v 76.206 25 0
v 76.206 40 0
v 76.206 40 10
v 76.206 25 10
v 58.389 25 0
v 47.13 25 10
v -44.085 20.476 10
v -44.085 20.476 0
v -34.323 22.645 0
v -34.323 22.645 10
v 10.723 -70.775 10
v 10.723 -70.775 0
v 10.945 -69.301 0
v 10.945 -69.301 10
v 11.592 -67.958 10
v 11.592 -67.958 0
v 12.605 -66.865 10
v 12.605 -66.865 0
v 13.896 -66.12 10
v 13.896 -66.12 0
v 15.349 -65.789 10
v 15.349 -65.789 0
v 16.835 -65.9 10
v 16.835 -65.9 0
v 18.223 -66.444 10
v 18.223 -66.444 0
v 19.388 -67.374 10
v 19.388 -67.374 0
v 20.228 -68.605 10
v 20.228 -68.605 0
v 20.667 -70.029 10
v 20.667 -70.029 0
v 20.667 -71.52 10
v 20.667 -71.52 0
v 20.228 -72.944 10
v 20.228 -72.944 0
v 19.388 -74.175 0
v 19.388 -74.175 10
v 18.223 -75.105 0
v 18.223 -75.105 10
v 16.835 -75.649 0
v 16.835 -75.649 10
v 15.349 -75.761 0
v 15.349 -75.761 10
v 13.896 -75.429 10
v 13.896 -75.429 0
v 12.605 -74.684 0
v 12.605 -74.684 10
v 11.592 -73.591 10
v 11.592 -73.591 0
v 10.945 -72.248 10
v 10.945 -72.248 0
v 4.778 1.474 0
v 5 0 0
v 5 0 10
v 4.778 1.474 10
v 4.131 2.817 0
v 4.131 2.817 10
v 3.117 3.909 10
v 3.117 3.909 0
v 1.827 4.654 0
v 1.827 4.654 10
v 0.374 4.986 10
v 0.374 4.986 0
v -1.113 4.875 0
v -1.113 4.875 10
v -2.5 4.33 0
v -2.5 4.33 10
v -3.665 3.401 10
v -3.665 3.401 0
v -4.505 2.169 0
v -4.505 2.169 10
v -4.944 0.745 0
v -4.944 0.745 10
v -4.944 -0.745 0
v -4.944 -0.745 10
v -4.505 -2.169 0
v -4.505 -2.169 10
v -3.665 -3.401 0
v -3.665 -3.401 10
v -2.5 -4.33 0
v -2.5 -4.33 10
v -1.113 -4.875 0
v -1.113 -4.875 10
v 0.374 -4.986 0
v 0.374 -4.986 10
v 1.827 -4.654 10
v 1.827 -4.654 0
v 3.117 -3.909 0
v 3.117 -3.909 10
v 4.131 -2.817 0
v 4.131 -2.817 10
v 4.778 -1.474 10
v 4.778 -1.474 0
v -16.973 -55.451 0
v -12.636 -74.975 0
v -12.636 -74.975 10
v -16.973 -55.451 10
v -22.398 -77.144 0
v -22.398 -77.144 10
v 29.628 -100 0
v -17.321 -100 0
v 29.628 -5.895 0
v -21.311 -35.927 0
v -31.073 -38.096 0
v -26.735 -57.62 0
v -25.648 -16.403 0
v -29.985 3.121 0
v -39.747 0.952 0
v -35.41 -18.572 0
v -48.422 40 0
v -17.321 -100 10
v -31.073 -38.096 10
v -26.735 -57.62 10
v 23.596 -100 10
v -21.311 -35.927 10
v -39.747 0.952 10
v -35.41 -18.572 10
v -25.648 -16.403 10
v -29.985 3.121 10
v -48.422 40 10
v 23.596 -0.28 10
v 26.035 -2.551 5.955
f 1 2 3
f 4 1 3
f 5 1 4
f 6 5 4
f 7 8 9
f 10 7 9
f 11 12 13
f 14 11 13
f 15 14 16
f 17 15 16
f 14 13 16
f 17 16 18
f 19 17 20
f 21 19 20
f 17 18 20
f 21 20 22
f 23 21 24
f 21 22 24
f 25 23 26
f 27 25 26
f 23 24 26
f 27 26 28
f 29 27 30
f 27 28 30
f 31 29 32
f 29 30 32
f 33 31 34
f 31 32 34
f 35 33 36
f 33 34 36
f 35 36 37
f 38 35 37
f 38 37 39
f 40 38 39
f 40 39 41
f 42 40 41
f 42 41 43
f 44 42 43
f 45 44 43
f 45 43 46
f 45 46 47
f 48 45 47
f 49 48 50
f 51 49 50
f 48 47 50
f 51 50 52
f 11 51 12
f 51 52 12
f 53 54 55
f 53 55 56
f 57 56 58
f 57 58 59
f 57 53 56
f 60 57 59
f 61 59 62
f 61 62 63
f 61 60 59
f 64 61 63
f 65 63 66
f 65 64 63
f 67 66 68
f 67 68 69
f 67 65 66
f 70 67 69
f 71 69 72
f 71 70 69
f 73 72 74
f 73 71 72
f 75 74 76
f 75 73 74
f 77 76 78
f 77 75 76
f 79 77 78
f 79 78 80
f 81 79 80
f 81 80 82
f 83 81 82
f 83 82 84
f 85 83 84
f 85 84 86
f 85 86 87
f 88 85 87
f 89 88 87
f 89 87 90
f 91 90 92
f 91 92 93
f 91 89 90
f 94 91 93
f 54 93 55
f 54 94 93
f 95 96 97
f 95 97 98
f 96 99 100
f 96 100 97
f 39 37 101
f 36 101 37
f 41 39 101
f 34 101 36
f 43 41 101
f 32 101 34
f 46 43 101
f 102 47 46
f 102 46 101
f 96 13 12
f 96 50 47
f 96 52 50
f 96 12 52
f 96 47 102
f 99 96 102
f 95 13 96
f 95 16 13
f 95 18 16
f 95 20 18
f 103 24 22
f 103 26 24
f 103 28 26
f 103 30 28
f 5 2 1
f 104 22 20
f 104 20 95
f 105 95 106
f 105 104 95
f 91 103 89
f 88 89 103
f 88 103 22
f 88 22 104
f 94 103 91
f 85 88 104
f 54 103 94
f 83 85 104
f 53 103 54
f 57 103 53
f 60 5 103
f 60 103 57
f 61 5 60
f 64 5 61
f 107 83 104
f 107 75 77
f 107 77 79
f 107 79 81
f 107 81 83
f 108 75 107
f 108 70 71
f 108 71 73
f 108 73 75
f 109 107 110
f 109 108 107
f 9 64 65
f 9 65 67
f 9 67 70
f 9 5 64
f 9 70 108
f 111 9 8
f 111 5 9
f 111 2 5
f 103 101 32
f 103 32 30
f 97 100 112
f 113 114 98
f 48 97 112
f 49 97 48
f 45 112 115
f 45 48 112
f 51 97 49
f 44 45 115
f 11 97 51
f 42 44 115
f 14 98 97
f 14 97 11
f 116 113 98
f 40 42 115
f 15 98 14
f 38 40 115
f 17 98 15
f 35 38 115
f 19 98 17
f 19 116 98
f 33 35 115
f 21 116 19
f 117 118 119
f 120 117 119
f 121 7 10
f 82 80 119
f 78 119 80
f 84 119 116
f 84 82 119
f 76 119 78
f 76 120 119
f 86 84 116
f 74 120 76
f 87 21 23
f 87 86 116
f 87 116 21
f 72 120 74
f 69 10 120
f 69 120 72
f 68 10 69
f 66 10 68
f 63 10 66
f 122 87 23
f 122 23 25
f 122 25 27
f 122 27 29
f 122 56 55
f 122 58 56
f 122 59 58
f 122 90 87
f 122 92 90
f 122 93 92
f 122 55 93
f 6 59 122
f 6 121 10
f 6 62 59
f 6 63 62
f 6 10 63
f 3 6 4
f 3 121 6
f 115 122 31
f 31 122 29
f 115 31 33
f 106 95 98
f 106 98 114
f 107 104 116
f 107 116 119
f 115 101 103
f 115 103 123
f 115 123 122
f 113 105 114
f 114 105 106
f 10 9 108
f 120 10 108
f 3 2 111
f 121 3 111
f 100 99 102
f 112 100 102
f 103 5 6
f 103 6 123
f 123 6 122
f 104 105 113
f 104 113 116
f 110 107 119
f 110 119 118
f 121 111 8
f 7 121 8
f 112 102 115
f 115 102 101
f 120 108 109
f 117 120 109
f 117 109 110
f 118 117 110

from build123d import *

# Parameters (mm, degrees)
SKETCH1_R           = 5
BOSS_EXTRUDE1_DEPTH = 10
CUT_EXTRUDE1_DEPTH  = 10
CUT_EXTRUDE2_DEPTH  = 10
CUT_EXTRUDE3_DEPTH  = 10
BOSS_EXTRUDE2_DEPTH = 15
SKETCH6_R           = 5
CUT_EXTRUDE4_DEPTH  = 10


with BuildPart() as part:
    # Sketch1 → Boss-Extrude1 (new body)
    with BuildSketch(Plane.XY):
        Polygon((-48.4220718, 40), (-17.320508076, -100), (29.627689013, -100), (29.627689013, -5.894941242), (72.353358785, 40), (54.770735732, 40), align=None)
        Circle(SKETCH1_R, mode=Mode.SUBTRACT)
    extrude(amount=BOSS_EXTRUDE1_DEPTH)

    # Sketch2 → Cut-Extrude1 (cut)
    with BuildSketch(Plane(origin=(0, 0, 0), x_dir=(-1, 0, 0), z_dir=(0, 0, -1))):
        Polygon((44.084731449, 20.475976883), (34.322719891, 22.644647058), (29.98537954, 3.120623941), (39.747391098, 0.951953766), align=None)
        Polygon((25.648039189, -16.403399176), (35.410050747, -18.572069352), (31.072710396, -38.096092469), (21.310698838, -35.927422293), align=None)
        Polygon((16.973358487, -55.45144541), (26.735370045, -57.620115586), (22.398029694, -77.144138703), (12.636018136, -74.975468528), align=None)
    extrude(amount=-CUT_EXTRUDE1_DEPTH, mode=Mode.SUBTRACT)

    # Sketch3 → Cut-Extrude2 (cut)
    with BuildSketch(Plane(origin=(11.20335331, -10.42970665, 12.614201102), x_dir=(-0.825201513, -0.359925431, 0.435311551), z_dir=(-0.564838439, 0.525833566, -0.635969023))):
        Polygon((-74.103118428, 30.827331886), (-22.327074543, -4.543132752), (-17.973959037, 1.829050982), (-4.444119228, 21.634320346), (-66.914441787, 64.310511288), (-84.797397101, 38.133058189), align=None)
    extrude(amount=-CUT_EXTRUDE2_DEPTH, mode=Mode.SUBTRACT)

    # Sketch4 → Cut-Extrude3 (cut)
    with BuildSketch(Plane(origin=(21.723952902, 0, 13.103449585), x_dir=(-0.516496434, 0, 0.85628934), z_dir=(-0.85628934, 0, -0.516496434))):
        Polygon((-3.624300151, -0.279668559), (-15.302595712, -5.894941242), (-15.302595712, -100), (-3.624300151, -100), align=None)
    extrude(amount=-CUT_EXTRUDE3_DEPTH, mode=Mode.SUBTRACT)

    # Sketch5 → Boss-Extrude2 (add)
    with BuildSketch(Plane(origin=(0, 40, 0), x_dir=(1, 0, 0), z_dir=(0, 1, 0))):
        Polygon((72.353358785, 0), (76.20595319, 0), (76.20595319, -10), (61.094050297, -10), (39.843773505, -10), (39.843773505, 0), (61.094050297, 0), align=None)
    extrude(amount=-BOSS_EXTRUDE2_DEPTH)

    # Sketch6 → Cut-Extrude4 (cut)
    with BuildSketch(Plane(origin=(0, 0, 0), x_dir=(-1, 0, 0), z_dir=(0, 0, -1))):
        with Locations((-15.722858772, -70.7745838)):
            Circle(SKETCH6_R)
    extrude(amount=-CUT_EXTRUDE4_DEPTH, mode=Mode.SUBTRACT)


solid = part.part
